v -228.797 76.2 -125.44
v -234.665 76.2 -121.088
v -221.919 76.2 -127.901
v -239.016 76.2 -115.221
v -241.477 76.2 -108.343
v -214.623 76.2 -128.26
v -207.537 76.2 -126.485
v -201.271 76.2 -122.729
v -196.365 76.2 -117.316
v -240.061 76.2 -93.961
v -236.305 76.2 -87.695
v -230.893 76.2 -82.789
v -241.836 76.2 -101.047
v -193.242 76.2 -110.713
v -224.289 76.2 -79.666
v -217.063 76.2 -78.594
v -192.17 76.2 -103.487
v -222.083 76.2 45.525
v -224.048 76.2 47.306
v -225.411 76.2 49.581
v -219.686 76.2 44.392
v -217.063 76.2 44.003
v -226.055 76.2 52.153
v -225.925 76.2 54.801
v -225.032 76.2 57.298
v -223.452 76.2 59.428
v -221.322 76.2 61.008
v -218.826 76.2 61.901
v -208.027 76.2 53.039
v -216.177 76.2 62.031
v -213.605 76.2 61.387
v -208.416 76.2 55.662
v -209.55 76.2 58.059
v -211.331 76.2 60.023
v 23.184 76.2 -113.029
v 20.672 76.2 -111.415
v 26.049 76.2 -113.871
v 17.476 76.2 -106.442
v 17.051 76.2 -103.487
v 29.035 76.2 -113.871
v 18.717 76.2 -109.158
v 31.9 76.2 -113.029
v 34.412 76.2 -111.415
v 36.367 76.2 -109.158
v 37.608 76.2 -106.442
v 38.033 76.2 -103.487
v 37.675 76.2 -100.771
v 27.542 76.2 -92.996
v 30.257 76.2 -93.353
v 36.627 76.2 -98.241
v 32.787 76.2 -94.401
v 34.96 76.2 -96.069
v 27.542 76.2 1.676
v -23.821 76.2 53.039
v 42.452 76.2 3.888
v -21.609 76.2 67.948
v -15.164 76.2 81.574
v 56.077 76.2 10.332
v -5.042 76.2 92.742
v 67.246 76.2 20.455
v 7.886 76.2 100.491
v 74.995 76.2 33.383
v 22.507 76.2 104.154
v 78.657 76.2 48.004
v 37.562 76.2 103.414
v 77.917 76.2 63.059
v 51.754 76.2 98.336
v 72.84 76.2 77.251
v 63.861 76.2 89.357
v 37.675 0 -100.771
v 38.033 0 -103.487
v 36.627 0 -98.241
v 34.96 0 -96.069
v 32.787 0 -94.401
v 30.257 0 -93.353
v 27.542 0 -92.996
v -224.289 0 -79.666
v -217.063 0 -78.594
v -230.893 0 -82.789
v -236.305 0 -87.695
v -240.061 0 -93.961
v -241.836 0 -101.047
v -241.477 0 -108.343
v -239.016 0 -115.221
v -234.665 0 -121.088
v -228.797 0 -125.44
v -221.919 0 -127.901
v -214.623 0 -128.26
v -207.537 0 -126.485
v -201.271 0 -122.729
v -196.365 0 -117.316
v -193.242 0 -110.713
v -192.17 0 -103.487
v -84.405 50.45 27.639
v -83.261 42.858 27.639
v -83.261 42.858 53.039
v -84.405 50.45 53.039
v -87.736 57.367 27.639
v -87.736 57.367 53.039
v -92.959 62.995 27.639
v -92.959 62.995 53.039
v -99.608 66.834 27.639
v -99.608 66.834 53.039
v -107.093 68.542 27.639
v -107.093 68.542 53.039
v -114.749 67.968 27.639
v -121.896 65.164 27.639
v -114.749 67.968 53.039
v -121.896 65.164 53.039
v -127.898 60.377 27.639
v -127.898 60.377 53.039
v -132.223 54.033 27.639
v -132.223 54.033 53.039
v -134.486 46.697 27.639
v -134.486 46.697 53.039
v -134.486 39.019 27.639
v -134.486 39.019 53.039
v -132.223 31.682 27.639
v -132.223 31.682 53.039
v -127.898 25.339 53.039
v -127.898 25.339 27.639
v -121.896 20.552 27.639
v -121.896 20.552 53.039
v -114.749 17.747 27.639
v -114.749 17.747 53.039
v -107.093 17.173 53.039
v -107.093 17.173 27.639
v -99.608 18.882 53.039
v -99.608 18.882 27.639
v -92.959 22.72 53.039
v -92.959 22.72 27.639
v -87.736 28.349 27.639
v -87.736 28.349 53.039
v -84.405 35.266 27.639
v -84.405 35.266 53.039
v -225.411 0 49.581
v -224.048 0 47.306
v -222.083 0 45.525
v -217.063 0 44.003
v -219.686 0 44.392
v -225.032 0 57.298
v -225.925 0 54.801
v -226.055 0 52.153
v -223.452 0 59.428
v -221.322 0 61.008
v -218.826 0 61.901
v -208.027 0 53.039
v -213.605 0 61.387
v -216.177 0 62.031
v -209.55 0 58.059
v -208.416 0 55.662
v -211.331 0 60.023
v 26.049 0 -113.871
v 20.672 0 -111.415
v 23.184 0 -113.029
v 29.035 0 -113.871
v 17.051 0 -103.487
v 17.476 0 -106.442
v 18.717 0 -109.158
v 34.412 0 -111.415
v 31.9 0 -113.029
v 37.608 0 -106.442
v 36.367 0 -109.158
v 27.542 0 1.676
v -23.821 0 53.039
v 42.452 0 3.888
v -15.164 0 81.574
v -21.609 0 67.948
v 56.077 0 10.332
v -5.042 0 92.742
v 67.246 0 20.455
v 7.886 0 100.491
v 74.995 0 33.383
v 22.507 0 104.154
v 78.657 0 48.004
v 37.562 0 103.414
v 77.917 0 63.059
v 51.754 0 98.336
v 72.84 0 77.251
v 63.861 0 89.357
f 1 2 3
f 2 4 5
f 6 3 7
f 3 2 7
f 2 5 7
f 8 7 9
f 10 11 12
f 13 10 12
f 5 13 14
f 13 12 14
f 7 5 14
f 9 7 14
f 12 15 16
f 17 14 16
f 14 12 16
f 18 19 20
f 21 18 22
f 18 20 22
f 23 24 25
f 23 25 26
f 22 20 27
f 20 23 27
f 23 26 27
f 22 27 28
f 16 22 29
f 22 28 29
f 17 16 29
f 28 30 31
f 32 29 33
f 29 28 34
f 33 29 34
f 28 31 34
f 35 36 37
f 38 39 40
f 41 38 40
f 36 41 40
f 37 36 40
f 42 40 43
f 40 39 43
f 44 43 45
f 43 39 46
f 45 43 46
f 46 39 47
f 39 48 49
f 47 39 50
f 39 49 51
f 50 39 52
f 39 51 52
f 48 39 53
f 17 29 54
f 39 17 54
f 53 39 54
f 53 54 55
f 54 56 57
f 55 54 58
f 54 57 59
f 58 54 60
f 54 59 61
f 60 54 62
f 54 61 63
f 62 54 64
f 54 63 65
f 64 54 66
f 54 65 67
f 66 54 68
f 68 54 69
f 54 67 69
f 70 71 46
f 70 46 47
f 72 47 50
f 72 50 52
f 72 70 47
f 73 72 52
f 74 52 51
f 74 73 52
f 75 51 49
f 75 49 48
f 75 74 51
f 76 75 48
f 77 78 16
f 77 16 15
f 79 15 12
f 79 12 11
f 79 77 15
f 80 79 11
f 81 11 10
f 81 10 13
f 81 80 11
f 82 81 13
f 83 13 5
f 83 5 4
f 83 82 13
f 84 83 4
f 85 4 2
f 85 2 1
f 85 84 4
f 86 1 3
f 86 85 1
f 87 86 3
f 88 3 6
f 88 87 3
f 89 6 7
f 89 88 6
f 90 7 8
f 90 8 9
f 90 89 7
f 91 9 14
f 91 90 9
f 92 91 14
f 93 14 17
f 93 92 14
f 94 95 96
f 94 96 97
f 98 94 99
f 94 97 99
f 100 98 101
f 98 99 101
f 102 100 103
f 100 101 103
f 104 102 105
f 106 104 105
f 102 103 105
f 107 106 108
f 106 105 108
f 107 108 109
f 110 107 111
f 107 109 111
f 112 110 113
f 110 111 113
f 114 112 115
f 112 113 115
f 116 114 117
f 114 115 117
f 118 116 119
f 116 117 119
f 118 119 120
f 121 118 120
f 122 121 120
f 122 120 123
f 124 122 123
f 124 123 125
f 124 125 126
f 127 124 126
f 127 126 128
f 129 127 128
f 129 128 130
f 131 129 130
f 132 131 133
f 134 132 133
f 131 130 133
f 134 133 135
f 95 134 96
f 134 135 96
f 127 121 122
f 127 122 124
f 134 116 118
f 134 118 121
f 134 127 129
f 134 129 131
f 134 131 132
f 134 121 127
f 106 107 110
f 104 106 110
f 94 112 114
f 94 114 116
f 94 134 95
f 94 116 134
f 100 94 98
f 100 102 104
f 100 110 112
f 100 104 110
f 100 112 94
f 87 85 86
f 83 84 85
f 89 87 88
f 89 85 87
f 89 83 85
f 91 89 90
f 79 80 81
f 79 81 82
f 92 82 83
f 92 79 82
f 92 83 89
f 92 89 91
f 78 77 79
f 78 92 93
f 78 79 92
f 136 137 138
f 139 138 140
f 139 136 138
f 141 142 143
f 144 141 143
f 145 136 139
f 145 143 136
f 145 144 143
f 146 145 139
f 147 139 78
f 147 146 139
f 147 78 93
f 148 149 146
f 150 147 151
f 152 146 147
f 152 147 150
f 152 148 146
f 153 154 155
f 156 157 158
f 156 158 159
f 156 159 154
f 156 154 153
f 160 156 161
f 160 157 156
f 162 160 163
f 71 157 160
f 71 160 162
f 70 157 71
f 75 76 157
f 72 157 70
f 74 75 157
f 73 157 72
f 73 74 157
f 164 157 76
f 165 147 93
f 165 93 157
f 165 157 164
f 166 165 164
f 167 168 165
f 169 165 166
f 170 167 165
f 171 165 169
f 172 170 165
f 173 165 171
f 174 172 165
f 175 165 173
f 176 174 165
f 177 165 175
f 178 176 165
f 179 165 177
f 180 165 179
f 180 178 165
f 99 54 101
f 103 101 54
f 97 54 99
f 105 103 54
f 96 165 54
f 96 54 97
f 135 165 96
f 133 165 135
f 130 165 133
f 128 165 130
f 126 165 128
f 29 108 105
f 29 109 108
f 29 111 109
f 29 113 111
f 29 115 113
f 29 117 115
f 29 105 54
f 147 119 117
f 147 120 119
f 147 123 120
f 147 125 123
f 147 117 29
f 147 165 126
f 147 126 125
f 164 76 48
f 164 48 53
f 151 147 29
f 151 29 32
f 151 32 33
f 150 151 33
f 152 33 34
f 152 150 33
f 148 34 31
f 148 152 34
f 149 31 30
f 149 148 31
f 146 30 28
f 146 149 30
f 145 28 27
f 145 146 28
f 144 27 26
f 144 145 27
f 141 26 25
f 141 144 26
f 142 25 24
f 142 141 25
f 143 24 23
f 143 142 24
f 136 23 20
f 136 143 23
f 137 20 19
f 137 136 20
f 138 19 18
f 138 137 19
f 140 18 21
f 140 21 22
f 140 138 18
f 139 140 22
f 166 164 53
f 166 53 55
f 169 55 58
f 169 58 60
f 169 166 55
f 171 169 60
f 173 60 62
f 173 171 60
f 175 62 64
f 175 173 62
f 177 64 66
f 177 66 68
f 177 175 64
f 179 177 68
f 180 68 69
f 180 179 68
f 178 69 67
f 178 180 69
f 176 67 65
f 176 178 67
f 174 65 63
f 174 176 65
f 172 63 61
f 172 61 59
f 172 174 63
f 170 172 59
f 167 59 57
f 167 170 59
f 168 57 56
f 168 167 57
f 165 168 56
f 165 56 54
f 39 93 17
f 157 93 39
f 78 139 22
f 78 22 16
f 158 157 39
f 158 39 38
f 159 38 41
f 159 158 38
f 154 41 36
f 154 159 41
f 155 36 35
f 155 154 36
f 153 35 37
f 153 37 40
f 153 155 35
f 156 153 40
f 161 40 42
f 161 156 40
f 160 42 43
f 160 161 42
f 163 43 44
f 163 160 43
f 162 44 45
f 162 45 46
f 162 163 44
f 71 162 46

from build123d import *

# Parameters (mm, degrees)
F1_DEPTH = 76.2
F2_R     = 25.7565229103
F3_DEPTH = 25.4


with BuildPart() as f1:
    # F0 (on Front) → F1 (new body)
    with BuildSketch(Plane.XZ):
        with BuildLine():
            Line((-217.0628905296, 44.0026623952), (-217.0628905296, 53.0386045575))
            Line((-217.0628905296, 53.0386045575), (-208.0269483673, 53.0386045575))
            ThreePointArc((-208.0269483673, 53.0386045575), (-223.452266507, 59.4279805349), (-217.0628905296, 44.0026623952))
        make_face()
        with BuildLine():
            ThreePointArc((78.9043606112, 53.0386045575), (27.5418888777, 104.401076291), (-23.8205828557, 53.0386045575))
            Line((-23.8205828557, 53.0386045575), (27.5418888777, 53.0386045575))
            Line((27.5418888777, 53.0386045575), (27.5418888777, 1.676132824))
            ThreePointArc((27.5418888777, 1.676132824), (63.860640939, 16.7198524963), (78.9043606112, 53.0386045575))
        make_face()
        with BuildLine():
            Line((-217.0628905296, -103.4866347909), (-217.0628905296, -78.593862027))
            ThreePointArc((-217.0628905296, -78.593862027), (-234.6647389535, -121.0884832148), (-192.1701177657, -103.4866347909))
            Line((-192.1701177657, -103.4866347909), (-217.0628905296, -103.4866347909))
        make_face()
        with BuildLine():
            ThreePointArc((38.0325649024, -103.4866347909), (34.959917034, -96.0686066346), (27.5418888777, -92.9959587662))
            Line((27.5418888777, -92.9959587662), (27.5418888777, -103.4866347909))
            Line((27.5418888777, -103.4866347909), (17.0512128531, -103.4866347909))
            ThreePointArc((17.0512128531, -103.4866347909), (27.5418888777, -113.9773108156), (38.0325649024, -103.4866347909))
        make_face()
        with BuildLine():
            Line((-208.0269483673, 53.0386045575), (-217.0628905296, 53.0386045575))
            Line((-217.0628905296, 53.0386045575), (-217.0628905296, 44.0026623952))
            ThreePointArc((-217.0628905296, 44.0026623952), (-210.6735145522, 46.6492285801), (-208.0269483673, 53.0386045575))
        make_face()
        with BuildLine():
            Line((27.5418888777, 53.0386045575), (-23.8205828557, 53.0386045575))
            ThreePointArc((-23.8205828557, 53.0386045575), (-8.7768631835, 16.7198524963), (27.5418888777, 1.676132824))
            Line((27.5418888777, 1.676132824), (27.5418888777, 53.0386045575))
        make_face()
        with BuildLine():
            ThreePointArc((-192.1701177657, -103.4866347909), (-199.4610421057, -85.884786367), (-217.0628905296, -78.593862027))
            Line((-217.0628905296, -78.593862027), (-217.0628905296, -103.4866347909))
            Line((-217.0628905296, -103.4866347909), (-192.1701177657, -103.4866347909))
        make_face()
        with BuildLine():
            Line((27.5418888777, -103.4866347909), (27.5418888777, -92.9959587662))
            ThreePointArc((27.5418888777, -92.9959587662), (20.1238607215, -96.0686066346), (17.0512128531, -103.4866347909))
            Line((17.0512128531, -103.4866347909), (27.5418888777, -103.4866347909))
        make_face()
        with BuildLine():
            Line((-23.8205828557, 53.0386045575), (-208.0269483673, 53.0386045575))
            ThreePointArc((-208.0269483673, 53.0386045575), (-210.6735145522, 46.6492285801), (-217.0628905296, 44.0026623952))
            Line((-217.0628905296, 44.0026623952), (-217.0628905296, -78.593862027))
            ThreePointArc((-217.0628905296, -78.593862027), (-199.4610421057, -85.884786367), (-192.1701177657, -103.4866347909))
            Line((-192.1701177657, -103.4866347909), (17.0512128531, -103.4866347909))
            ThreePointArc((17.0512128531, -103.4866347909), (20.1238607215, -96.0686066346), (27.5418888777, -92.9959587662))
            Line((27.5418888777, -92.9959587662), (27.5418888777, 1.676132824))
            ThreePointArc((27.5418888777, 1.676132824), (-8.7768631835, 16.7198524963), (-23.8205828557, 53.0386045575))
        make_face()
    extrude(amount=-F1_DEPTH)

    # F2 (on face) → F3 (cut)
    with BuildSketch(Plane.XY.offset(53.0386045575)):
        with Locations((-109.0174764395, 42.8577400744)):
            Circle(F2_R)
    extrude(amount=-F3_DEPTH, mode=Mode.SUBTRACT)


solid = f1.part
